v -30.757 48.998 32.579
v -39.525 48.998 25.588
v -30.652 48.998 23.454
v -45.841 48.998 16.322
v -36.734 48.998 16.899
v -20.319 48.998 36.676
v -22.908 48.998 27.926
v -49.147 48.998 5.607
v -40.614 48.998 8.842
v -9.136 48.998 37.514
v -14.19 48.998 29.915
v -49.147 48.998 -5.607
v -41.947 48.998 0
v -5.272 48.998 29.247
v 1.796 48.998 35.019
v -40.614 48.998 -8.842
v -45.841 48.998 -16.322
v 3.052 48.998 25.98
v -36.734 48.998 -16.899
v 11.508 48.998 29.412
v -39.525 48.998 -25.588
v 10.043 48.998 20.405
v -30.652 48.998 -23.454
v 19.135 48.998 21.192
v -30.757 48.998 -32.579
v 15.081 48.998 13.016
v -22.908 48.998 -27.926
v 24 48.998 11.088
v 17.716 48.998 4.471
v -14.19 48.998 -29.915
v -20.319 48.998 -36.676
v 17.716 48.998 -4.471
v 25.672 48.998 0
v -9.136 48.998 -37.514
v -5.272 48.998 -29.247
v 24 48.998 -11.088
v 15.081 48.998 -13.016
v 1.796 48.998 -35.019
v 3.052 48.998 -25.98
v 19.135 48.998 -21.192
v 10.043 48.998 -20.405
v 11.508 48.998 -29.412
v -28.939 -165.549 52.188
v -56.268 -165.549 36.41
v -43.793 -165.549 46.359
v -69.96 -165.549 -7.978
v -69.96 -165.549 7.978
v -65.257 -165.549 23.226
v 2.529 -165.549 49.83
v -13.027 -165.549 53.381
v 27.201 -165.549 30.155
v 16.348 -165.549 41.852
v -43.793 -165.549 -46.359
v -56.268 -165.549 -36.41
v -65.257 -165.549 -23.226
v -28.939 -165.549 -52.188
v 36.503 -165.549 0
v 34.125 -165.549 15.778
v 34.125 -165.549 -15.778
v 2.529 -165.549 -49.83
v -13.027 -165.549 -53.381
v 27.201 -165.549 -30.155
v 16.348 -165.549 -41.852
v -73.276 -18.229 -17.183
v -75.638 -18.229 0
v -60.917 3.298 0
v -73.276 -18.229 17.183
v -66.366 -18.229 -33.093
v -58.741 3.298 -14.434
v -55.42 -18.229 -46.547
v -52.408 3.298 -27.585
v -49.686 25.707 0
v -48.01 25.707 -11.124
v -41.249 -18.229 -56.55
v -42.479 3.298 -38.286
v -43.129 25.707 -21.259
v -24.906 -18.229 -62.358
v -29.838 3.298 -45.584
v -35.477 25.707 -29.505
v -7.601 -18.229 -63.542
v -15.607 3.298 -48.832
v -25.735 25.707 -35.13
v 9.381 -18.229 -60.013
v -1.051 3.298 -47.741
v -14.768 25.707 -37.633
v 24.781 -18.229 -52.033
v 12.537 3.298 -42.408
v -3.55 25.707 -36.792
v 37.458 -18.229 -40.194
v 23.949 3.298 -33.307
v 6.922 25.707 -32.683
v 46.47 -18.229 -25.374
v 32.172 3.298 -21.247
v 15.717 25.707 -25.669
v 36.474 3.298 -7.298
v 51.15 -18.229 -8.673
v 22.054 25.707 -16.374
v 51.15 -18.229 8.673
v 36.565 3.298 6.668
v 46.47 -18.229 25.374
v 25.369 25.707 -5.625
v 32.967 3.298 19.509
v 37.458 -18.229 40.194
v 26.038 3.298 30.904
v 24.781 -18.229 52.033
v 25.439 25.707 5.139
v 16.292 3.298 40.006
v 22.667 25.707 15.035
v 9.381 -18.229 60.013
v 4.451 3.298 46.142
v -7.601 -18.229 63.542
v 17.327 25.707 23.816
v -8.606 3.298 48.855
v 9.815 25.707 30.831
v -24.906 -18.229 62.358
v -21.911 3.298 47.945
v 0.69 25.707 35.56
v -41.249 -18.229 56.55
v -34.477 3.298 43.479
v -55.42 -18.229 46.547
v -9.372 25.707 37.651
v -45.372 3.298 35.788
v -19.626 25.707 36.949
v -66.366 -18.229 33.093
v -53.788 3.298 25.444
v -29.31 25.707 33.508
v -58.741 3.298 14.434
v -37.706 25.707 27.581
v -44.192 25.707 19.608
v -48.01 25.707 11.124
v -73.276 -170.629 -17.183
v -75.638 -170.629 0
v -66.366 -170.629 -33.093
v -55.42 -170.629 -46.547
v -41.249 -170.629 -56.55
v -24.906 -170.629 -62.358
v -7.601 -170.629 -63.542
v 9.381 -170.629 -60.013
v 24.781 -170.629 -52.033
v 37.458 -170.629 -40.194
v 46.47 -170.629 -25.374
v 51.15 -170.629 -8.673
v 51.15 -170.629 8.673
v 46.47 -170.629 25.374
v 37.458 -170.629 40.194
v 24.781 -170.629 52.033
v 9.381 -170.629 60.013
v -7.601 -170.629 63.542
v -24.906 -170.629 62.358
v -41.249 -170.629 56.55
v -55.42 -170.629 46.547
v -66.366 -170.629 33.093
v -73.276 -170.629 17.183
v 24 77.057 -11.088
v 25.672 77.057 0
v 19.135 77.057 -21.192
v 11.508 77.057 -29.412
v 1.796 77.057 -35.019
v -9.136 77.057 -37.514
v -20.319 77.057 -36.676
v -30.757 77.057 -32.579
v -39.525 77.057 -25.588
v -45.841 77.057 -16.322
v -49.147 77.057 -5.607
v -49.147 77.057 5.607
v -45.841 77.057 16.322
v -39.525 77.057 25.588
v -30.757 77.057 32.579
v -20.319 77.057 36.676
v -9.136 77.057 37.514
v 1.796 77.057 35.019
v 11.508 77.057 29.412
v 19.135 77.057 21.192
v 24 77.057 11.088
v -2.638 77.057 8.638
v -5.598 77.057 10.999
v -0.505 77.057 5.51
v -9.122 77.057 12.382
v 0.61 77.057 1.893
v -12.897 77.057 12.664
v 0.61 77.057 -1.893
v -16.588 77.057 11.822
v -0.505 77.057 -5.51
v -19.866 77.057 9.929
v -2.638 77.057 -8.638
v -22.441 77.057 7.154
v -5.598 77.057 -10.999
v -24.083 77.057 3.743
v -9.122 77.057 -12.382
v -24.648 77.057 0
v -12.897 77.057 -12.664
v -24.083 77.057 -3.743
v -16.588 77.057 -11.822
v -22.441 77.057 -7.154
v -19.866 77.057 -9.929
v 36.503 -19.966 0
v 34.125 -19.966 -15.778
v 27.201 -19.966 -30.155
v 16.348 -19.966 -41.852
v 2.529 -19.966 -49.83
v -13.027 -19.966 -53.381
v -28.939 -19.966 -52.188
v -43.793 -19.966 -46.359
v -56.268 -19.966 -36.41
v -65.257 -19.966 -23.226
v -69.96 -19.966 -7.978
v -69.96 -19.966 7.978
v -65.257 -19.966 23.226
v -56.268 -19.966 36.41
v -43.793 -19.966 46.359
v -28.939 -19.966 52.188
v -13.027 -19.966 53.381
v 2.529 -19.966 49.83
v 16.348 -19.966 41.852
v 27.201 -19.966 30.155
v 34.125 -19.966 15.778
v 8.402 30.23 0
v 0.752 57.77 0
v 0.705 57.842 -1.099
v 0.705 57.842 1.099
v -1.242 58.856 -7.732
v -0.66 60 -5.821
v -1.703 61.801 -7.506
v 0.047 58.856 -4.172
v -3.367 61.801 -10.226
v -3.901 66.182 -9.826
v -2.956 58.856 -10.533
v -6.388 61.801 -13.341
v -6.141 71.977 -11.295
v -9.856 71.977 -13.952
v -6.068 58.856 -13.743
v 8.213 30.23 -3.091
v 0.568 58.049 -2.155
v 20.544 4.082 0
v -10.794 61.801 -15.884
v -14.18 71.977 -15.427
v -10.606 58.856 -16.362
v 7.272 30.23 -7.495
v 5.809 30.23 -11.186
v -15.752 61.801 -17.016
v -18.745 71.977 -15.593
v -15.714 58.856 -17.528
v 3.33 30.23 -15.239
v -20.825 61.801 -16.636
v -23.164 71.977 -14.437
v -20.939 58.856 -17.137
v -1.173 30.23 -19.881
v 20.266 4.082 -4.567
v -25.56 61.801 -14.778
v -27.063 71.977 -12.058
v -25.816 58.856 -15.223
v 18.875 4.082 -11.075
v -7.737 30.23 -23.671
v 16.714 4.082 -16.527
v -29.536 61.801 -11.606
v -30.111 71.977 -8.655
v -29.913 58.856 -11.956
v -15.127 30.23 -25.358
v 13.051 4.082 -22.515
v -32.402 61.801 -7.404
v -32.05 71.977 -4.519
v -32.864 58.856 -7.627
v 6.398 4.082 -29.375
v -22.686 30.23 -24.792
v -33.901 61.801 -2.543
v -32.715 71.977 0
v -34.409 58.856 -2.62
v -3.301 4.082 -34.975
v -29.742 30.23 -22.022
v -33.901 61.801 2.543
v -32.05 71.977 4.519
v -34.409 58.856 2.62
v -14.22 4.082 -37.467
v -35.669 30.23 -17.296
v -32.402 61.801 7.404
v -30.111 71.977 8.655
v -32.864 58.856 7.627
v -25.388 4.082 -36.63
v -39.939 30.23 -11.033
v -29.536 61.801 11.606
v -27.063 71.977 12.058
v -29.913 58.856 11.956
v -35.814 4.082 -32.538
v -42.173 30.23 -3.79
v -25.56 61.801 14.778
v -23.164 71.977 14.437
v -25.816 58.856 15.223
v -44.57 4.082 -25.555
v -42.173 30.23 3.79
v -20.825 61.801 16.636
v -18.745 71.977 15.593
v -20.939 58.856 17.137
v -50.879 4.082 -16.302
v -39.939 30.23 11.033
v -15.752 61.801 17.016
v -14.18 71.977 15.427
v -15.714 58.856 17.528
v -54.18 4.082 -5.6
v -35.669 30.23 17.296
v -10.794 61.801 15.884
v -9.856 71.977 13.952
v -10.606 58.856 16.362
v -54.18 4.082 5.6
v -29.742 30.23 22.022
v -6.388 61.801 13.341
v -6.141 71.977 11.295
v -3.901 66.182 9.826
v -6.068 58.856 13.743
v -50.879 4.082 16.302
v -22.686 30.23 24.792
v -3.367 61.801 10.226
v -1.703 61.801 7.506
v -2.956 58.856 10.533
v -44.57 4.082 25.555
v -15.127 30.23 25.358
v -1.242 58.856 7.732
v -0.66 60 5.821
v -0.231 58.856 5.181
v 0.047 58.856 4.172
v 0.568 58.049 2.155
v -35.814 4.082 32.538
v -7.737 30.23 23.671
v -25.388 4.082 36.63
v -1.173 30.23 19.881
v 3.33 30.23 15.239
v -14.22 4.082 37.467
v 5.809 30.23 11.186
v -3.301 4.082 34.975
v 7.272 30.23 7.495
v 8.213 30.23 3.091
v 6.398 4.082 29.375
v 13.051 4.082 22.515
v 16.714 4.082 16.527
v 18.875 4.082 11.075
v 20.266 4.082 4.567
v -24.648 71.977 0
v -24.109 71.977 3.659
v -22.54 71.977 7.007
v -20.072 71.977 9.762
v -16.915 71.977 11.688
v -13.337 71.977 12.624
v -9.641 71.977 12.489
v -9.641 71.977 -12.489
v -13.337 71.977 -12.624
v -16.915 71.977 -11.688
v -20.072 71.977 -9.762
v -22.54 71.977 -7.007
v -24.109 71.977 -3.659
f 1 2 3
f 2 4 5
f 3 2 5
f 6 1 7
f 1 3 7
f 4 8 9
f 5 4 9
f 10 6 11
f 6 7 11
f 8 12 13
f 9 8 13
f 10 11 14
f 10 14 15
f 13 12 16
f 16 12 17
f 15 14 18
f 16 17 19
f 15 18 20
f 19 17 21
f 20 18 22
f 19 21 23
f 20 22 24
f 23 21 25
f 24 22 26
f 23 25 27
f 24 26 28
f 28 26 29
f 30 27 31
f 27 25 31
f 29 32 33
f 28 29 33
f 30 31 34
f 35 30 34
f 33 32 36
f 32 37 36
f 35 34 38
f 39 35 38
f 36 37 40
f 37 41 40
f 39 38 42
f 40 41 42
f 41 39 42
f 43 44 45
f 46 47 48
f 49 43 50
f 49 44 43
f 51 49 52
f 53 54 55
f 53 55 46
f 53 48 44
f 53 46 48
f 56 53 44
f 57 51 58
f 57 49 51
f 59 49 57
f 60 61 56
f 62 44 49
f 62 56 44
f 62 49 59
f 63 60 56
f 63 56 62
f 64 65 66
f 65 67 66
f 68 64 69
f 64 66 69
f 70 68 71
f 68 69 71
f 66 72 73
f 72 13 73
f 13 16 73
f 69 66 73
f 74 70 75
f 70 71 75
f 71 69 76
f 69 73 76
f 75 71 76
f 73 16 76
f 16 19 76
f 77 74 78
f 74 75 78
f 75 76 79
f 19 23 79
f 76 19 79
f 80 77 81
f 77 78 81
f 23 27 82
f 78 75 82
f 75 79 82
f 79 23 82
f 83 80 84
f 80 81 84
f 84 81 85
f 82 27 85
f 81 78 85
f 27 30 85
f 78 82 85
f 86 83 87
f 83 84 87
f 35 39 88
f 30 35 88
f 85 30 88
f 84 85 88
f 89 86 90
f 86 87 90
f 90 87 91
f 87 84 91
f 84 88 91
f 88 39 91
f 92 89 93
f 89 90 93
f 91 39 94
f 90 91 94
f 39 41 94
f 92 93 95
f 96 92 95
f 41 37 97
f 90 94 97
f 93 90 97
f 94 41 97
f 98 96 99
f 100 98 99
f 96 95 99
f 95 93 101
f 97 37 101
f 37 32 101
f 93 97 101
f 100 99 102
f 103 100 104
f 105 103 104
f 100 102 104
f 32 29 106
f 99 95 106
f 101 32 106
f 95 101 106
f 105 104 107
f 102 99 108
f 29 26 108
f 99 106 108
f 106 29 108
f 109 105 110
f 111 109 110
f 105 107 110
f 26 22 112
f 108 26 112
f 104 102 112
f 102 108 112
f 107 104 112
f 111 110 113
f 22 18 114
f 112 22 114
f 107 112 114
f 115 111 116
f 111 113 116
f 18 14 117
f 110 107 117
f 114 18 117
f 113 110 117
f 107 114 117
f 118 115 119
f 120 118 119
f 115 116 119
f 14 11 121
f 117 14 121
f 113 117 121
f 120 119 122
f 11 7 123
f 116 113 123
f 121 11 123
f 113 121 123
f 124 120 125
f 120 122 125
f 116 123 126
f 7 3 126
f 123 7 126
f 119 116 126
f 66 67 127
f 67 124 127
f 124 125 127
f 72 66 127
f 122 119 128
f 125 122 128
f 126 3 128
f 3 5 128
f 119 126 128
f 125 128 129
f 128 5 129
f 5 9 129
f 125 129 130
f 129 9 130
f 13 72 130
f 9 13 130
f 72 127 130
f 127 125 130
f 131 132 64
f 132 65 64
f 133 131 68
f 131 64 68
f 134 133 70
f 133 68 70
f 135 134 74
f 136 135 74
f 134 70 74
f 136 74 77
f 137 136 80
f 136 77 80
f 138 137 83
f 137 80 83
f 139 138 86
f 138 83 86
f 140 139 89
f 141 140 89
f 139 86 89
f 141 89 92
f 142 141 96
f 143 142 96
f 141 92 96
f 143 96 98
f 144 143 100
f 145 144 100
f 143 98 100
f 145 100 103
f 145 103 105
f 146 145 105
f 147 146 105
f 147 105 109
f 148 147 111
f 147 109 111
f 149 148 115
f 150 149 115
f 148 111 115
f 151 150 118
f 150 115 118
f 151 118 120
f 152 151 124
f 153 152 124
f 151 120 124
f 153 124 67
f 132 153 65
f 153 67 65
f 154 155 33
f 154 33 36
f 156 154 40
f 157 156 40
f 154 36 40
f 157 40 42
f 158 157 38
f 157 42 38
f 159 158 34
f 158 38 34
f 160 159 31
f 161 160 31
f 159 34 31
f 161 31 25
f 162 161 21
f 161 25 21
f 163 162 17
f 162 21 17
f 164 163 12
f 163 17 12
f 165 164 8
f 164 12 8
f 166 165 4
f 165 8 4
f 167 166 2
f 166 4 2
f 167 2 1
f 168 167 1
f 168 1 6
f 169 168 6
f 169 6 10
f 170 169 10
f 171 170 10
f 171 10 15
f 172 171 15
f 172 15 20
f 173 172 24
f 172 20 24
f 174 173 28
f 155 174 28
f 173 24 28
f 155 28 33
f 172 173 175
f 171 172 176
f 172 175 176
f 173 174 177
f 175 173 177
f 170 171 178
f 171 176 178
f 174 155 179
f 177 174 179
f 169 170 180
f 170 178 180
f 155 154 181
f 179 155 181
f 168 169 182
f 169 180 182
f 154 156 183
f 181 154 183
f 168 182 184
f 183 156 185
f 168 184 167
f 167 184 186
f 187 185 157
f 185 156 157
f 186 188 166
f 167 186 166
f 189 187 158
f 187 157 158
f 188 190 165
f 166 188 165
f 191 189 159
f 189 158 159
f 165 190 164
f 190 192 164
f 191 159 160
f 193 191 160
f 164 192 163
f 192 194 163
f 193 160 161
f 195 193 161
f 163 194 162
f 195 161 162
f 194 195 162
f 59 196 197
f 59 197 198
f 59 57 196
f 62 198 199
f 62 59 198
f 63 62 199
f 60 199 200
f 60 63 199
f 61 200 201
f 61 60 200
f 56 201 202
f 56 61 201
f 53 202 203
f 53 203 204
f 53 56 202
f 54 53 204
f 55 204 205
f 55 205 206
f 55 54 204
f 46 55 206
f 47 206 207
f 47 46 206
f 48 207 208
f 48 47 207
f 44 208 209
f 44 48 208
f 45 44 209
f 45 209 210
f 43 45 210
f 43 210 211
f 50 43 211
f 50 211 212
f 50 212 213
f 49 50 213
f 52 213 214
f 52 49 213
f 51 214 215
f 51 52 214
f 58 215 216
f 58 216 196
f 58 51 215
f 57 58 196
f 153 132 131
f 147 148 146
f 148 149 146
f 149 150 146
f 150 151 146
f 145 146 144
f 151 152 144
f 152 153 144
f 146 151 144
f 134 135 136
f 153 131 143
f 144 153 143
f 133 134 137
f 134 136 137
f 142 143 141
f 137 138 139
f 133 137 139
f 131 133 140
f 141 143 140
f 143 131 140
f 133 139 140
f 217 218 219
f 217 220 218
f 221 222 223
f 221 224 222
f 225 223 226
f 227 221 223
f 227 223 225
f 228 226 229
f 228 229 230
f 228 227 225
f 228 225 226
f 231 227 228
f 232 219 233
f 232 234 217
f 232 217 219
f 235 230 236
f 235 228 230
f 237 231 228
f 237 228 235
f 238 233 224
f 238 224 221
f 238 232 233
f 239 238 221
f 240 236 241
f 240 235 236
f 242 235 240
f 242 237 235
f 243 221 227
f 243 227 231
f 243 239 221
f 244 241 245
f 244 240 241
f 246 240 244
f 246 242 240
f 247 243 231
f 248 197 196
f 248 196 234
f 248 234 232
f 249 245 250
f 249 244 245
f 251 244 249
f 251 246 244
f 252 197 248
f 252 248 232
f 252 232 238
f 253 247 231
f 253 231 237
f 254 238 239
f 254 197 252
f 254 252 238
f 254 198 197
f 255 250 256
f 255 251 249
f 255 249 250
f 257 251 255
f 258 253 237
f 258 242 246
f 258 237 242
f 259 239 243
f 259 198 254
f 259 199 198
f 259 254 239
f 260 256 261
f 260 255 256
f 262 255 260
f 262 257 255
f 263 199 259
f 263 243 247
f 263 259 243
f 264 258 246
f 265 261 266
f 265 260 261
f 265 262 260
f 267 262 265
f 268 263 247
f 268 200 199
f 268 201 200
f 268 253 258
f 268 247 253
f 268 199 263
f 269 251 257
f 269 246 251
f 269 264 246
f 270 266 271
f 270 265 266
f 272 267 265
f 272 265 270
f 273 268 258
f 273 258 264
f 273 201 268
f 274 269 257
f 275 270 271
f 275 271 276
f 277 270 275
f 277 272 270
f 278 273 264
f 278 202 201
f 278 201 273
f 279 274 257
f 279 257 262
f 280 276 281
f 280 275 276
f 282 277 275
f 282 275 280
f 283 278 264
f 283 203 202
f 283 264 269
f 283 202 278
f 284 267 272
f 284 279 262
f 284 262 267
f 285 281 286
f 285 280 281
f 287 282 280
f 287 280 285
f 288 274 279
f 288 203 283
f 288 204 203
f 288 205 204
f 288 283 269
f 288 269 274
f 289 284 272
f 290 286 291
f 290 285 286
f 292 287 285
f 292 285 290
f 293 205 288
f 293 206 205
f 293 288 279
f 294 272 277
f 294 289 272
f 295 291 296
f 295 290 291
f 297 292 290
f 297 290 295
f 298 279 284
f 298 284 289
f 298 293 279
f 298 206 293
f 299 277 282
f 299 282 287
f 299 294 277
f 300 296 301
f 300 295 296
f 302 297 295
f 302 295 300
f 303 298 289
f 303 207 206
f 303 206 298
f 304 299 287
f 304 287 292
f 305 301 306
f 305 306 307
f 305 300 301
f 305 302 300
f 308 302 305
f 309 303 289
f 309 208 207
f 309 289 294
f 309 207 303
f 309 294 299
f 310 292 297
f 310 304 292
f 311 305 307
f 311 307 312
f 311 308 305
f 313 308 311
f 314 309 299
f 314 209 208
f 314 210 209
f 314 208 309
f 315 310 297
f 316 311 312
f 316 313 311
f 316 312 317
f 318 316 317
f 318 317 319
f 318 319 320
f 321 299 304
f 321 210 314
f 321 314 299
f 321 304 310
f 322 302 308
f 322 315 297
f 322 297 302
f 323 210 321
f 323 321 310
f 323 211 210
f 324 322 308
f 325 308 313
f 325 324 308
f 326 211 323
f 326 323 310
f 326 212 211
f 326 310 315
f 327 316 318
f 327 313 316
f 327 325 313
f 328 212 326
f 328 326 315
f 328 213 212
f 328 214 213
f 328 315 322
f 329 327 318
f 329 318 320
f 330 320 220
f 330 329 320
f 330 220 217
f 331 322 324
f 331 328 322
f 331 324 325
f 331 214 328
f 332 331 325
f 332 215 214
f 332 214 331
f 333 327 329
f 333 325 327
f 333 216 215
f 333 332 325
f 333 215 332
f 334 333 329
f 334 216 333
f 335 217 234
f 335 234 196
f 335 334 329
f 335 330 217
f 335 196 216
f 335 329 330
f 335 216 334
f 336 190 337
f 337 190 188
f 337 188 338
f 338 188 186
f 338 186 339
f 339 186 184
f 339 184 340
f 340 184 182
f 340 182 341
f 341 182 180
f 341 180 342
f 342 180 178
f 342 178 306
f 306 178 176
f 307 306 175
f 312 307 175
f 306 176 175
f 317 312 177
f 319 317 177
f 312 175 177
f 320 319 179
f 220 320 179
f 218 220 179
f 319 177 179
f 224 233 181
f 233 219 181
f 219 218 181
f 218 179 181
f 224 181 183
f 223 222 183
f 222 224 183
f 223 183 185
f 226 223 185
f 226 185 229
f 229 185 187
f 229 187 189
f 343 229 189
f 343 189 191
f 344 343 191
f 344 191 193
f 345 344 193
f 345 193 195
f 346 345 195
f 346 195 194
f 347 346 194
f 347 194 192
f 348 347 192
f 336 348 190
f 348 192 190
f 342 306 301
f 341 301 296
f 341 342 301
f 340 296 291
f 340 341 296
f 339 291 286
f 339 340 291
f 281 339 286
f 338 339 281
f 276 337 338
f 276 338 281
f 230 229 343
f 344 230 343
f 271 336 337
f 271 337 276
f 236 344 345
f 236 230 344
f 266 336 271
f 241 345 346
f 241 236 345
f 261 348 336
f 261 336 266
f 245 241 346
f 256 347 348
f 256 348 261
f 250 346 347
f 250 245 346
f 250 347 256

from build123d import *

# Parameters (mm, degrees)
SKETCH4_R          = 12.7
CUT_EXTRUDE1_DEPTH = 50.8


with BuildPart() as part:
    # Sketch2 → Revolve1 (revolve)
    with BuildSketch(Plane.XY):
        with BuildLine():
            Line((-11.947688608, 77.056557333), (-11.947688608, -170.628560352))
            Line((-11.947688608, -170.628560352), (-75.638147441, -170.628560352))
            Line((-75.638147441, -170.628560352), (-75.638147441, -18.228560352))
            add(Edge.make_bspline(
                [(-75.638147441, -18.228560352), (-41.40779095, 25.603897983), (-37.347688608, 77.056557333)],
                knots=[0, 0, 0, 1, 1, 1], degree=2))
            Line((-37.347688608, 77.056557333), (-11.947688608, 77.056557333))
        make_face()
    revolve(axis=Axis((-11.947688608, 77.056557333, 0), (0, -1, 0)))

    # Sketch3 → Revolve2 (revolve)
    with BuildSketch(Plane.XY, mode=Mode.PRIVATE) as revolve2_sk:
        with BuildLine():
            Line((-49.56693434, 48.997587312), (-41.94693434, 48.997587312))
            add(Edge.make_bspline(
                [(-37.347688606, 77.05655735), (-38.47805175, 62.73174853), (-41.946934336, 48.997587311)],
                knots=[0, 0, 0, 0.27840755, 0.27840755, 0.27840755], degree=2))
            Line((-37.347688606, 77.05655735), (-49.56693434, 77.05655735))
            Line((-49.56693434, 77.05655735), (-49.56693434, 48.997587312))
        make_face()
    revolve(revolve2_sk.sketch.rotate(Axis((-11.947688608, -170.628560352, 0), (0, 1, 0)), 180), axis=Axis((-11.947688608, -170.628560352, 0), (0, 1, 0)))

    # Sketch4 → Cut-Extrude1 (cut)
    with BuildSketch(Plane(origin=(0, 77.056557333, 0), x_dir=(1, 0, 0), z_dir=(0, 1, 0))):
        with Locations(Location((-11.947688608, 0, 0), (0, 0, 180))):
            Circle(SKETCH4_R)
    extrude(amount=-CUT_EXTRUDE1_DEPTH, mode=Mode.SUBTRACT)

    # Sketch5 → Cut-Revolve1 (revolve, cut)
    with BuildSketch(Plane.XY, mode=Mode.PRIVATE) as cut_revolve1_sk:
        with BuildLine():
            Line((-17.027688608, -165.548560352), (-17.027688608, 71.976557333))
            Line((-17.027688608, 71.976557333), (-32.715004421, 71.976557333))
            add(Edge.make_bspline(
                [(-32.715004421, 71.976557333), (-34.491548465, 55.152406634), (-38.639010582, 39.007317693), (-45.89970512, 21.587276989), (-46.742513348, 19.662046222), (-48.500048501, 15.832183135), (-49.416278966, 13.924686931), (-52.256576763, 8.26403653), (-54.274096029, 4.567347719), (-60.67628191, -6.3053686), (-65.409969255, -13.264423559), (-70.558147441, -19.965805759)],
                knots=[0, 0, 0, 0, 0.5, 0.5, 0.5625, 0.5625, 0.625, 0.625, 0.75, 0.75, 1, 1, 1, 1], degree=3))
            Line((-70.558147441, -19.965805759), (-70.558147441, -165.548560352))
            Line((-70.558147441, -165.548560352), (-17.027688608, -165.548560352))
        make_face()
    revolve(cut_revolve1_sk.sketch.rotate(Axis((-17.027688608, -165.548560352, 0), (0, 1, 0)), 180), axis=Axis((-17.027688608, -165.548560352, 0), (0, 1, 0)), mode=Mode.SUBTRACT)


solid = part.part
